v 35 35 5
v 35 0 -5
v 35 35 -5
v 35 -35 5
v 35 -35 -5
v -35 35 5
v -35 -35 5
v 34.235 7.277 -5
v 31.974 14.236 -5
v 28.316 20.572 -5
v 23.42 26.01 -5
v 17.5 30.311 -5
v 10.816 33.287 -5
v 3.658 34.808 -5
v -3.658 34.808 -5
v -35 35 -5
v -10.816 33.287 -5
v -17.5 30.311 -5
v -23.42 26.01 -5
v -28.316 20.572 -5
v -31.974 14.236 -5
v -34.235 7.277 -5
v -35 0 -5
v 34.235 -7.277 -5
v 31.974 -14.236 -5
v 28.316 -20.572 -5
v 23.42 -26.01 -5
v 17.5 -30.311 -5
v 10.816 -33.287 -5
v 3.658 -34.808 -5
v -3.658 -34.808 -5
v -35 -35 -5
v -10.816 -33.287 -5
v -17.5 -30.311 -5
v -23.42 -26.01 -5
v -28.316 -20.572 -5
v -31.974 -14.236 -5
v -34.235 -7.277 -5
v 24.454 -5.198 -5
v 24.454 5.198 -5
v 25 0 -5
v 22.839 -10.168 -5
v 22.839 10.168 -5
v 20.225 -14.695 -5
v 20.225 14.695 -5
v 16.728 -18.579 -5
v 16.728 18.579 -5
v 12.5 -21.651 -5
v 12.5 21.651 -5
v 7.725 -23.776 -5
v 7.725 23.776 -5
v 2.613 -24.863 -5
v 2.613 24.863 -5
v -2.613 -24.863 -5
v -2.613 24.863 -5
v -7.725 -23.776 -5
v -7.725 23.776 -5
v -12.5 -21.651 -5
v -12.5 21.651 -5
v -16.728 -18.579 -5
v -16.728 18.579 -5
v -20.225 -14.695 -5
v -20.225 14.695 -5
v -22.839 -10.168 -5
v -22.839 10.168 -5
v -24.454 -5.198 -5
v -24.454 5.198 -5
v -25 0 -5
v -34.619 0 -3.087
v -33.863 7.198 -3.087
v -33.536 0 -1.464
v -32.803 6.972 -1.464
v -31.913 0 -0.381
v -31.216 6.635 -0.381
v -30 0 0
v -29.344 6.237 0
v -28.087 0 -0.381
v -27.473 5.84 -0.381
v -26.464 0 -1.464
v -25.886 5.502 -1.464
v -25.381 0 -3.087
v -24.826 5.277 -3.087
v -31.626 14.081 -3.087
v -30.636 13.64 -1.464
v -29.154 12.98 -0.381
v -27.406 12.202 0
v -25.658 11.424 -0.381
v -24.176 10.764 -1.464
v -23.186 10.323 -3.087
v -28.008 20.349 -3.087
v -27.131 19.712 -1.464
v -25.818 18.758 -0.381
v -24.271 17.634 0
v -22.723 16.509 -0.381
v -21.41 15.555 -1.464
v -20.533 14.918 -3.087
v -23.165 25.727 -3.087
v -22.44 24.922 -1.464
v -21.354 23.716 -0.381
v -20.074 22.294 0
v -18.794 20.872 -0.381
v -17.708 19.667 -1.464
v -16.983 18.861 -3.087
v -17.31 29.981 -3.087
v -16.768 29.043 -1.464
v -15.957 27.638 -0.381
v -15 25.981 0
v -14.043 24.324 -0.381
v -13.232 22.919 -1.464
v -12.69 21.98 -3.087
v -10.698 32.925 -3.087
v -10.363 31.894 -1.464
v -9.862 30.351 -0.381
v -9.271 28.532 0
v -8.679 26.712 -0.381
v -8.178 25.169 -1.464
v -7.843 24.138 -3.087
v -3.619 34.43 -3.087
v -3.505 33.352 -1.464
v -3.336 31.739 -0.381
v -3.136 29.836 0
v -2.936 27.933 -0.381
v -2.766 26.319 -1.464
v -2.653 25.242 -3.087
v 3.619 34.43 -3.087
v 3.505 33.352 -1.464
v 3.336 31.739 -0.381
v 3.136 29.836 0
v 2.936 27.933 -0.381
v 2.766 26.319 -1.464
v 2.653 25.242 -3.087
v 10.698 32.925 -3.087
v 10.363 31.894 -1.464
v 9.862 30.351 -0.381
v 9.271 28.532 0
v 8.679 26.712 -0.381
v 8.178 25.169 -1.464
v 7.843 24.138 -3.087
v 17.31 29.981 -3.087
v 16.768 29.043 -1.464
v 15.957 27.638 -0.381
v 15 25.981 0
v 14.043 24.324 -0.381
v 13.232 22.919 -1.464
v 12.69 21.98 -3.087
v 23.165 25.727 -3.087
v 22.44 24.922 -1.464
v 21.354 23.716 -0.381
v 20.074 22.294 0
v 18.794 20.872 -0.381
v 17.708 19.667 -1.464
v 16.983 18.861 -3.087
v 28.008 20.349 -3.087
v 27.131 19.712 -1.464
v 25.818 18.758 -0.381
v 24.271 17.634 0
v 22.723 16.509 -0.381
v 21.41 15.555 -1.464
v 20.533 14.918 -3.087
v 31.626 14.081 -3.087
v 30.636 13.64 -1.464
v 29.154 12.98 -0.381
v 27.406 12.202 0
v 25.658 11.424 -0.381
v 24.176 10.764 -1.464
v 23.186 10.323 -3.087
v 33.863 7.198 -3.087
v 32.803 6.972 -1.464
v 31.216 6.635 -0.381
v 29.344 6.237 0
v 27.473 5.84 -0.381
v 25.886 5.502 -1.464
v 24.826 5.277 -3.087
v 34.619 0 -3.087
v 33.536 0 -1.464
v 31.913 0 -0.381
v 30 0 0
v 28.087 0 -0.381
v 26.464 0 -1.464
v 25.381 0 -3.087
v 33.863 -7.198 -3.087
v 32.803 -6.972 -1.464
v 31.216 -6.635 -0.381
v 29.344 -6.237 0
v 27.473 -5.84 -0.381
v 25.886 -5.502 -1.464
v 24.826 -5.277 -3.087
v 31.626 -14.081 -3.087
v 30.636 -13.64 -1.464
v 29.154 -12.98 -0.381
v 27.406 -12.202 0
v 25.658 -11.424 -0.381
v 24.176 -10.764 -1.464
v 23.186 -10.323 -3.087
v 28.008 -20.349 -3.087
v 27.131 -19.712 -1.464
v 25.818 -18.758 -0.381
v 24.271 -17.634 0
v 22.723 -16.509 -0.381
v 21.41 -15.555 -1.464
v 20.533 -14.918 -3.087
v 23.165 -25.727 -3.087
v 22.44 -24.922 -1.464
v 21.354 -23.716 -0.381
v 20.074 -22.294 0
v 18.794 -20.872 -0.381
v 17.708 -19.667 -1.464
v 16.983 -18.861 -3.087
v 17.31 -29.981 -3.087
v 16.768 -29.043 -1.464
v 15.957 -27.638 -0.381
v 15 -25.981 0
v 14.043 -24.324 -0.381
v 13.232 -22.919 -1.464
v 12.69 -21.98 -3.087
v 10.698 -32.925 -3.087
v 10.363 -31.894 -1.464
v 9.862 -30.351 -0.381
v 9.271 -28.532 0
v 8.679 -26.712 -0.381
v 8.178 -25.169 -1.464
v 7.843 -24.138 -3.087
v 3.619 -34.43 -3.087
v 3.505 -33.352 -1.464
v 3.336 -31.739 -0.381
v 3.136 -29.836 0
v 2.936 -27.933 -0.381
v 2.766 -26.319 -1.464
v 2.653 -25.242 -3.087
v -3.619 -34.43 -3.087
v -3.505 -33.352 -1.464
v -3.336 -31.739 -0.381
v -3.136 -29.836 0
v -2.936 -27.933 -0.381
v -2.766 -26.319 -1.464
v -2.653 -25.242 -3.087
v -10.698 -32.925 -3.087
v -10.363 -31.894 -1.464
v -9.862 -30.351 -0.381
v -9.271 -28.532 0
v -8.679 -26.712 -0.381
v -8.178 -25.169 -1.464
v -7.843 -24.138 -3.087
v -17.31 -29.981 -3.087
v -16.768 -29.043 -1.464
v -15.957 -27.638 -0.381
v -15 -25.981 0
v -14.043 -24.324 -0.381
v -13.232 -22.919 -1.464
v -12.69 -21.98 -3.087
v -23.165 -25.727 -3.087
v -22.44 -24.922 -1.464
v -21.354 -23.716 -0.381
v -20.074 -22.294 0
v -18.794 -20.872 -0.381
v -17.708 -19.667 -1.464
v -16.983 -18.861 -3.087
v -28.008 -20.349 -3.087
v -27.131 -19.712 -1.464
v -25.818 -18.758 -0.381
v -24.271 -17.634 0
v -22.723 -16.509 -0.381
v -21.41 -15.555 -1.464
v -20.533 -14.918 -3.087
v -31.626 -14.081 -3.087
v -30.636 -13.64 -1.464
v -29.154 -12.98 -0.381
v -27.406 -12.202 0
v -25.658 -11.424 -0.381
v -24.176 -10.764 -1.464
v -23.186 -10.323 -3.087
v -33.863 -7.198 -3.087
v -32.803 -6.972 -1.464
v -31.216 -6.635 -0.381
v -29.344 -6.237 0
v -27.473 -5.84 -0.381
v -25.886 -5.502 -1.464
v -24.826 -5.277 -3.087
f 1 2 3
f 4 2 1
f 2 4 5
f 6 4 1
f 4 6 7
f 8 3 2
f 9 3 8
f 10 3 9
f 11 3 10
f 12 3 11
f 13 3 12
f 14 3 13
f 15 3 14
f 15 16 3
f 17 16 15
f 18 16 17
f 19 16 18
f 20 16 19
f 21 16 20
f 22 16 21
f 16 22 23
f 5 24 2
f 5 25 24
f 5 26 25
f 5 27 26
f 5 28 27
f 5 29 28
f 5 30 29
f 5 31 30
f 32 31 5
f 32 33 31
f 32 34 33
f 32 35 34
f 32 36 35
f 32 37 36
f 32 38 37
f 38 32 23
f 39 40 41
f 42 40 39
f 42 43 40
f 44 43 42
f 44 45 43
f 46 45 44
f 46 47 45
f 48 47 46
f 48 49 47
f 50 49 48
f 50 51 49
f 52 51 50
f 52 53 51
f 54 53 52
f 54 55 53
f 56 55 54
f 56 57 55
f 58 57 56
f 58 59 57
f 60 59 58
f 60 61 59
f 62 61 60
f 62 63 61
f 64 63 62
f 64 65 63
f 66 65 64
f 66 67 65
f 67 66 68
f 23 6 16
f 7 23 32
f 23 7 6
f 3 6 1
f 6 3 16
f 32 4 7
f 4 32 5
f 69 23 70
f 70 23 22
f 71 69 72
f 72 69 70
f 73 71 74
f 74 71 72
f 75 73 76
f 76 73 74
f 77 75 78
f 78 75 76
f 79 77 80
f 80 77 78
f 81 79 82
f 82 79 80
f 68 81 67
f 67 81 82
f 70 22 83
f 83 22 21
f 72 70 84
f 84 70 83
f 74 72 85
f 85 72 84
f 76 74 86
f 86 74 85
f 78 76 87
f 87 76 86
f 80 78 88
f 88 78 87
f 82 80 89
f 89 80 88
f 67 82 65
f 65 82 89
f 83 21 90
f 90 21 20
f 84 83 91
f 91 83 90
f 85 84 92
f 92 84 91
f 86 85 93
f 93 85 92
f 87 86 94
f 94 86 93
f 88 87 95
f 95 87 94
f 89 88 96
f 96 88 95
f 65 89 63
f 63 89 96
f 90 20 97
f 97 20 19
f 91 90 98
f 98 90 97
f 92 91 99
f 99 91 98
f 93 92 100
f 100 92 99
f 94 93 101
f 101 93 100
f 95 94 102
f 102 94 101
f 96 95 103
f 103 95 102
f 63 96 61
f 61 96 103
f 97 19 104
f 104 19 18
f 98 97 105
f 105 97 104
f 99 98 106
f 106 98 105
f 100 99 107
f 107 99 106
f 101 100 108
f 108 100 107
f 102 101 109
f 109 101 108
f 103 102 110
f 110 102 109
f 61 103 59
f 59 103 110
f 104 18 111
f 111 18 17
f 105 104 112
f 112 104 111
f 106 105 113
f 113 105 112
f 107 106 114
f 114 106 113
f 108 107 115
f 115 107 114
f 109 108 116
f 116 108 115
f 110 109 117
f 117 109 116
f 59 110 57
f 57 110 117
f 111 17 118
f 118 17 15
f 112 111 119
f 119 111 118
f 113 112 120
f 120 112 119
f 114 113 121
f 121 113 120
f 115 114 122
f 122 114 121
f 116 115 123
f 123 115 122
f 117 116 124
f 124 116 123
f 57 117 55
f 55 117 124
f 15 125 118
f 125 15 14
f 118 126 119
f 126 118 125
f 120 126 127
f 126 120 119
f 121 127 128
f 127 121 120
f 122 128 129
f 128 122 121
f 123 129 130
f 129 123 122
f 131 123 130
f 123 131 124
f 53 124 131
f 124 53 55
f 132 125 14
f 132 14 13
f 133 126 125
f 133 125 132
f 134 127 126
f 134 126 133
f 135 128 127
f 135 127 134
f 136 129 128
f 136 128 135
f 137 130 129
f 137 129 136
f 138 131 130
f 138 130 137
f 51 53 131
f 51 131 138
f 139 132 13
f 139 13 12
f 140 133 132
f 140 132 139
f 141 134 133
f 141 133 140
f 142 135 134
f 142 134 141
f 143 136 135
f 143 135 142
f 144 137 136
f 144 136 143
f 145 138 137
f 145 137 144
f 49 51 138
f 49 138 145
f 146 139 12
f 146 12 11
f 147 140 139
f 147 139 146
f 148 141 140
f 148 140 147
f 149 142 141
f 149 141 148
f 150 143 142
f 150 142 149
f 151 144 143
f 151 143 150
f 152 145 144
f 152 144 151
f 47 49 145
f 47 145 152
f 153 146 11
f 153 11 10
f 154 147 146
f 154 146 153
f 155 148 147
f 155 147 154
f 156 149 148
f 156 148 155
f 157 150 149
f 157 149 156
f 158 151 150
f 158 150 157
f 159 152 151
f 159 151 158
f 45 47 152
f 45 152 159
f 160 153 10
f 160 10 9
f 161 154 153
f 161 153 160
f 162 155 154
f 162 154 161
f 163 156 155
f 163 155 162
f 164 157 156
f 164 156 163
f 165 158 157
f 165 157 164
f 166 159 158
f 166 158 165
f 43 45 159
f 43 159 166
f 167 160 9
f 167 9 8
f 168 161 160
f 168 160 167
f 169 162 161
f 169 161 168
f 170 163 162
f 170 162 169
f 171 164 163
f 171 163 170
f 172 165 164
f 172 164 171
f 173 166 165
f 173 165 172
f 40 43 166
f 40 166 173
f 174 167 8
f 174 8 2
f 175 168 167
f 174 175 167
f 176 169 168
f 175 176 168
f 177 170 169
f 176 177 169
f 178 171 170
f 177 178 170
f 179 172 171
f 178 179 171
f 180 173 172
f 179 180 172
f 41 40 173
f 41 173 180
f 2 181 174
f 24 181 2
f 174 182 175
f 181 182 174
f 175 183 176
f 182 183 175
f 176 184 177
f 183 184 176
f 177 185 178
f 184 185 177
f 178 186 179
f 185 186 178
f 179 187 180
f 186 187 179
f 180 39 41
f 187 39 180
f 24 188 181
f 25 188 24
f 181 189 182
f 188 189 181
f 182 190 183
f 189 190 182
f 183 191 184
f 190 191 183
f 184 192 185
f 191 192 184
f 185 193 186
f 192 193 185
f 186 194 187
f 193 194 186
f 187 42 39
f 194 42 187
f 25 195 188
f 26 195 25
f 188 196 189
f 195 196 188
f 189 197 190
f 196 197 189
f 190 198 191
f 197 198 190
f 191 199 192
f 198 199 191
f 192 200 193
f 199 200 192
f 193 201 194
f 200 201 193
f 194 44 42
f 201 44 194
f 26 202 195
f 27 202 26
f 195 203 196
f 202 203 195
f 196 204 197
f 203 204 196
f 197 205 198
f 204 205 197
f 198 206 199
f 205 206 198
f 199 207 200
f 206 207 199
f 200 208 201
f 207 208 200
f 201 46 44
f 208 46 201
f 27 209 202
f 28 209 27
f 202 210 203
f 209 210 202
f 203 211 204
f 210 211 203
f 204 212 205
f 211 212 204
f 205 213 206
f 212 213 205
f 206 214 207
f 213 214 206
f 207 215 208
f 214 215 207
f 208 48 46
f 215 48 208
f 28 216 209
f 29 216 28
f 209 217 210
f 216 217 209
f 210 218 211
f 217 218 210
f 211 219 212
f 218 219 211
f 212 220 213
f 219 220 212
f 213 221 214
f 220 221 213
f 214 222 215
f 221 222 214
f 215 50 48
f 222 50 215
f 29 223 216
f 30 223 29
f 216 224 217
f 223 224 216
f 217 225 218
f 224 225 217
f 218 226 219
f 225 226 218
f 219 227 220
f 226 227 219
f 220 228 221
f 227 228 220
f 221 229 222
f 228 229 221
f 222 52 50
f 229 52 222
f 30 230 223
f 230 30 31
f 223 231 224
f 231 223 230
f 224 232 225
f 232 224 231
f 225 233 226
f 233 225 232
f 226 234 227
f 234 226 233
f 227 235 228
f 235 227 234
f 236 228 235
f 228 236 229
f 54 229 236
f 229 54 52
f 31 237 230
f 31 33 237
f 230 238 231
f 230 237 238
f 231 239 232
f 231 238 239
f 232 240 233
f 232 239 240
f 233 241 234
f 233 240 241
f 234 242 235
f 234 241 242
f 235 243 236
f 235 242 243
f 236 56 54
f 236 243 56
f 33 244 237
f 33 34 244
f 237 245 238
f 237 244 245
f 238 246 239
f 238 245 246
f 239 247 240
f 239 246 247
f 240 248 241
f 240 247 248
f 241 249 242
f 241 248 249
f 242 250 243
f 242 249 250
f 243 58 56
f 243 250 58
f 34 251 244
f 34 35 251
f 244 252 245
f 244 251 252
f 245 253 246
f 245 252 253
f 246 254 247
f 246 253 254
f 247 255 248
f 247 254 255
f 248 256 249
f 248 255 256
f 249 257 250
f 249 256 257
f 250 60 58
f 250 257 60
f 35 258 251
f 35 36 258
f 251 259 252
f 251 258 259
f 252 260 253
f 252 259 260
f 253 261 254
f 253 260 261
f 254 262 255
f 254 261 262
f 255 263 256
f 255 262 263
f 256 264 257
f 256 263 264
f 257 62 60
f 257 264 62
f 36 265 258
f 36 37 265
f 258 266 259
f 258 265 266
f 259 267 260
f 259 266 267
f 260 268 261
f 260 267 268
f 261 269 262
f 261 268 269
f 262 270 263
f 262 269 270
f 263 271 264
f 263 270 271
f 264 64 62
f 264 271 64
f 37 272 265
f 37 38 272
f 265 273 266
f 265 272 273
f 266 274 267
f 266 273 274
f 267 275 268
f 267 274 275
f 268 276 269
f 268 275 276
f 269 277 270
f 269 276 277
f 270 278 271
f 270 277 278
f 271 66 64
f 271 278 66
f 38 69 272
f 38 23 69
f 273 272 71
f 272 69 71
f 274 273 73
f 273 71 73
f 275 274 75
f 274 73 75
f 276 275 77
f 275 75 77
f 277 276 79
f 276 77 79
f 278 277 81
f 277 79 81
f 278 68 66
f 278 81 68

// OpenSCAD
//minkowski() {hull() {translate([0,0,0.005]) cube([30,40,0.01], center=true); translate([0,0,9.995]) cube([20,30,0.01],center=true);} sphere(5);}


//translate([0,0,50]) minkowski() {cylinder(h=90, d=30, center=true); sphere(r=5);}

//difference() {cube([10,10,20], center=true); for(dx=[-5,5],dy=[-5,5]) translate([dx,dy,0]) cylinder(h=20.1, r=5, center=true);}

difference() {cube([70,70,10], center=true); translate([0,0,-5]) rotate_extrude(convexity=4) translate([30,0,0]) circle(r=5);}      
